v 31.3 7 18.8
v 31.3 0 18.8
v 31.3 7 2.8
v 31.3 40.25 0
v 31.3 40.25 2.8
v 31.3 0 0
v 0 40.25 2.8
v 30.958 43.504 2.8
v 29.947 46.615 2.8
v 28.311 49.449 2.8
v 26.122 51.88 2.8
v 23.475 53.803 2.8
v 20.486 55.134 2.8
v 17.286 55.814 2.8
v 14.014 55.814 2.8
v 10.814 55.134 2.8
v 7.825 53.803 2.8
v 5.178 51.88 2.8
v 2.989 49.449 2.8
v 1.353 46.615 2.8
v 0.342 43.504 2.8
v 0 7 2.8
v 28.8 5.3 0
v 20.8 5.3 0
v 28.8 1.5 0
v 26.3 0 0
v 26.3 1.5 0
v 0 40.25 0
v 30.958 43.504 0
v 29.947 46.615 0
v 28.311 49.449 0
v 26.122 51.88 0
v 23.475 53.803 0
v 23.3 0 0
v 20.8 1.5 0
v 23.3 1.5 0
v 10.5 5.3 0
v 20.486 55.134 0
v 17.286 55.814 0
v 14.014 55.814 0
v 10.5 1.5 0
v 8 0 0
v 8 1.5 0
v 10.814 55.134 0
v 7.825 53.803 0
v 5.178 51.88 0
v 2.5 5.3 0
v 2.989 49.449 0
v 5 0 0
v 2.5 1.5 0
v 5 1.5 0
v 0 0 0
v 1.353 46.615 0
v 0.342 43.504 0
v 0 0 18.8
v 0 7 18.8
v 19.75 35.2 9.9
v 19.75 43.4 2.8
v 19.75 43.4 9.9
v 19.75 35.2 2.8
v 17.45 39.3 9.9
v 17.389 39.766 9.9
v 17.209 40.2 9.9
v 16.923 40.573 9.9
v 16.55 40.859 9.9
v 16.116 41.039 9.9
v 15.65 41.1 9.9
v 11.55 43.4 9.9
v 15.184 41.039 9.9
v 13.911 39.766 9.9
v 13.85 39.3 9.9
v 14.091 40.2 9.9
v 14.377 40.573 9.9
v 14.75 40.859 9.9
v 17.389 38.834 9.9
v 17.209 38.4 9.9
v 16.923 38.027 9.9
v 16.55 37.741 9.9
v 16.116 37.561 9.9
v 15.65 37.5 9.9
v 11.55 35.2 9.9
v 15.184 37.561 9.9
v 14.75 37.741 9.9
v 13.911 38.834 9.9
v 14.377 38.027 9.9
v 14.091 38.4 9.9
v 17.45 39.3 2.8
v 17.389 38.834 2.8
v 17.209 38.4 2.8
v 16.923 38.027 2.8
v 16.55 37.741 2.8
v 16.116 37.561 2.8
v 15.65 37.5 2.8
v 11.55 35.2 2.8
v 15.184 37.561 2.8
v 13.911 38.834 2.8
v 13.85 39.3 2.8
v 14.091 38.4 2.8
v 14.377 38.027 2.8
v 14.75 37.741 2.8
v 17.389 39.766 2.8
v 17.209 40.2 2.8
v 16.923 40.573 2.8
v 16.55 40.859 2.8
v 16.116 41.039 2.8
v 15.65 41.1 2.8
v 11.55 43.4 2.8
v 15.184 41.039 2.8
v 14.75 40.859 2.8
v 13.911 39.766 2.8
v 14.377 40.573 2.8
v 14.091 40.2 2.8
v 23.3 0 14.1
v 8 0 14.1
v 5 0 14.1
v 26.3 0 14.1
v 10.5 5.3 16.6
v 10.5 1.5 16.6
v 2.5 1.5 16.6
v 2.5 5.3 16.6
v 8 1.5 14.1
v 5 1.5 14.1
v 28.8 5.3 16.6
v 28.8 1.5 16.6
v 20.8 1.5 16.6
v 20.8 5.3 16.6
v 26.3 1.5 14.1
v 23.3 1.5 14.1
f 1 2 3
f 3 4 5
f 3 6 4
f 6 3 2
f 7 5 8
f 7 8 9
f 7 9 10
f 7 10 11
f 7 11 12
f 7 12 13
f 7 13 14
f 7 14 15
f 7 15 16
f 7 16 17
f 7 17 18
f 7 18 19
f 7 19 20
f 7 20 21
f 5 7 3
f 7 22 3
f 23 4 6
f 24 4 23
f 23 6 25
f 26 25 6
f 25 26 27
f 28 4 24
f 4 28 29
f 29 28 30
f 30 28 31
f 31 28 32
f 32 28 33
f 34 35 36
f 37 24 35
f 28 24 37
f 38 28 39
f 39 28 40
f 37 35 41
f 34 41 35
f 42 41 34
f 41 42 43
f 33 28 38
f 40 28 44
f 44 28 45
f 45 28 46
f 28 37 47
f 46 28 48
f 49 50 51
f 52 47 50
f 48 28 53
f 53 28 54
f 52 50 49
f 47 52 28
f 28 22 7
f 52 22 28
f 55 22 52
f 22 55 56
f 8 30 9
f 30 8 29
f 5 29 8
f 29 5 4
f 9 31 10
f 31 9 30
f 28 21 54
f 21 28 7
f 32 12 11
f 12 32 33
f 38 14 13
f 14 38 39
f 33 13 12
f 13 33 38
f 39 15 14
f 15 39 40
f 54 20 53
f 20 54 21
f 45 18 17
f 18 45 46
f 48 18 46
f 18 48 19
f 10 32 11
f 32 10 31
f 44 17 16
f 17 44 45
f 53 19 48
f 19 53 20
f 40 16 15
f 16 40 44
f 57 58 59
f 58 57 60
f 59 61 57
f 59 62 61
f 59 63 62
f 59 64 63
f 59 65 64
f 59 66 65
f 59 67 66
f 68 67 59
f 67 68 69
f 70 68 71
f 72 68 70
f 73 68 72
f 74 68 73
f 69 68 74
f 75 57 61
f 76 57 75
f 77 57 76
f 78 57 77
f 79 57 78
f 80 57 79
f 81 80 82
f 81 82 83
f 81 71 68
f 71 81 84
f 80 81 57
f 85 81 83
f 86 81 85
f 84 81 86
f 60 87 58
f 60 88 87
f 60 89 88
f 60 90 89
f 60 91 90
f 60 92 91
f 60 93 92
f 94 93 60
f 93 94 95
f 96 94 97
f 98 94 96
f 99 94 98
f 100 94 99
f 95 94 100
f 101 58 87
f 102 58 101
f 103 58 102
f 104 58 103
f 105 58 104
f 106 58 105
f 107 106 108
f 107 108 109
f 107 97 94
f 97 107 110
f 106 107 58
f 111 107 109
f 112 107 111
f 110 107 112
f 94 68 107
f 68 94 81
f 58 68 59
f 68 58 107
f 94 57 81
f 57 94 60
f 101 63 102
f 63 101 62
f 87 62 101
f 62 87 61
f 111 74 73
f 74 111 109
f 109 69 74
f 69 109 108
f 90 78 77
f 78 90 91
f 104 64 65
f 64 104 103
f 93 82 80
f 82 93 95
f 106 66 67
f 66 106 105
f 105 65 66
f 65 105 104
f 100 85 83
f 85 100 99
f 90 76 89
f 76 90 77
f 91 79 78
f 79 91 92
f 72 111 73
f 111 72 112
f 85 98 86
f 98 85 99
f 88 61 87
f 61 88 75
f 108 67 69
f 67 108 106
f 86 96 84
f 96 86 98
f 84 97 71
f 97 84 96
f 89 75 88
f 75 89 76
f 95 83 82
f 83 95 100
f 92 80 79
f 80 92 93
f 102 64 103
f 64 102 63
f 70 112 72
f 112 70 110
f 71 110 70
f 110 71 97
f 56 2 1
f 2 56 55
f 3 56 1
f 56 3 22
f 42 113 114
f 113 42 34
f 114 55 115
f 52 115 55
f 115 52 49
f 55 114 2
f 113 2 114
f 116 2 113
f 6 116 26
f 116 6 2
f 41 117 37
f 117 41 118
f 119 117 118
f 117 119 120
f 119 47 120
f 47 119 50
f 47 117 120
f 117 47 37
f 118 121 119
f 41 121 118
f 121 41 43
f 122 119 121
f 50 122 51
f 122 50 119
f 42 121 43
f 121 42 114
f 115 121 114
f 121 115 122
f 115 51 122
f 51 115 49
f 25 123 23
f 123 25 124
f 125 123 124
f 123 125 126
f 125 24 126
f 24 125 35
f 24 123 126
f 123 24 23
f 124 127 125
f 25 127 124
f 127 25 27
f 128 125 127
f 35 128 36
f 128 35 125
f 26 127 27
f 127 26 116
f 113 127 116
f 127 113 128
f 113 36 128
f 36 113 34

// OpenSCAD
// Roller blinkd holder

// Copyright (C) 2015 Jeremy Bennett <jeremy@jeremybennett.com>

// Contributor: Jeremy Bennett <jeremy@jeremybennett.com>

// This file is licensed under the Creative Commons Attribution-ShareAlike 3.0
// Unported License. To view a copy of this license, visit
// http://creativecommons.org/licenses/by-sa/3.0/ or send a letter to Creative
// Commons, PO Box 1866, Mountain View, CA 94042, USA.

EPS = 0.0001;


module back () {
   translate (v = [0.0, 7.0 - EPS, 0.0])
   cube (size = [31.3, 55.9 - (31.3 / 2) - 7.0, 2.8], center = false);
   translate (v = [31.3 / 2, 55.9 - (31.3 / 2)])
      cylinder(r = 31.3 / 2, h = 2.8, center = false);
}


module knob () {
   translate (v = [(31.3 - 8.2) / 2, 35.2, 2.8])
      difference () {
         cube (size = [8.2, 8.2, 7.1], center = false);
         translate (v = [8.2 / 2, 8.2 / 2, 0])
            cylinder (r = 1.8, h = 7.1, center = false, $fn = 24);
      }
}

module bottom () {
   difference () {
      cube (size = [31.3, 7, 18.8], center = false);
      translate (v = [2.5, 1.5, 0.0])
         cube (size = [8.0, 3.8, 16.6], center = false);
      translate (v = [5.0, 0.0, 0.0])
         cube (size = [3.0, 1.5, 14.1], center = false);
      translate (v = [31.3 - 2.5 - 8.0, 1.5, 0.0])
         cube (size = [8.0, 3.8, 16.6], center = false);
      translate (v = [31.3 - 5.0 - 3.0, 0.0, 0.0])
         cube (size = [3.0, 1.5, 14.1], center = false);
   }
}

back ();
knob ();
bottom ();
